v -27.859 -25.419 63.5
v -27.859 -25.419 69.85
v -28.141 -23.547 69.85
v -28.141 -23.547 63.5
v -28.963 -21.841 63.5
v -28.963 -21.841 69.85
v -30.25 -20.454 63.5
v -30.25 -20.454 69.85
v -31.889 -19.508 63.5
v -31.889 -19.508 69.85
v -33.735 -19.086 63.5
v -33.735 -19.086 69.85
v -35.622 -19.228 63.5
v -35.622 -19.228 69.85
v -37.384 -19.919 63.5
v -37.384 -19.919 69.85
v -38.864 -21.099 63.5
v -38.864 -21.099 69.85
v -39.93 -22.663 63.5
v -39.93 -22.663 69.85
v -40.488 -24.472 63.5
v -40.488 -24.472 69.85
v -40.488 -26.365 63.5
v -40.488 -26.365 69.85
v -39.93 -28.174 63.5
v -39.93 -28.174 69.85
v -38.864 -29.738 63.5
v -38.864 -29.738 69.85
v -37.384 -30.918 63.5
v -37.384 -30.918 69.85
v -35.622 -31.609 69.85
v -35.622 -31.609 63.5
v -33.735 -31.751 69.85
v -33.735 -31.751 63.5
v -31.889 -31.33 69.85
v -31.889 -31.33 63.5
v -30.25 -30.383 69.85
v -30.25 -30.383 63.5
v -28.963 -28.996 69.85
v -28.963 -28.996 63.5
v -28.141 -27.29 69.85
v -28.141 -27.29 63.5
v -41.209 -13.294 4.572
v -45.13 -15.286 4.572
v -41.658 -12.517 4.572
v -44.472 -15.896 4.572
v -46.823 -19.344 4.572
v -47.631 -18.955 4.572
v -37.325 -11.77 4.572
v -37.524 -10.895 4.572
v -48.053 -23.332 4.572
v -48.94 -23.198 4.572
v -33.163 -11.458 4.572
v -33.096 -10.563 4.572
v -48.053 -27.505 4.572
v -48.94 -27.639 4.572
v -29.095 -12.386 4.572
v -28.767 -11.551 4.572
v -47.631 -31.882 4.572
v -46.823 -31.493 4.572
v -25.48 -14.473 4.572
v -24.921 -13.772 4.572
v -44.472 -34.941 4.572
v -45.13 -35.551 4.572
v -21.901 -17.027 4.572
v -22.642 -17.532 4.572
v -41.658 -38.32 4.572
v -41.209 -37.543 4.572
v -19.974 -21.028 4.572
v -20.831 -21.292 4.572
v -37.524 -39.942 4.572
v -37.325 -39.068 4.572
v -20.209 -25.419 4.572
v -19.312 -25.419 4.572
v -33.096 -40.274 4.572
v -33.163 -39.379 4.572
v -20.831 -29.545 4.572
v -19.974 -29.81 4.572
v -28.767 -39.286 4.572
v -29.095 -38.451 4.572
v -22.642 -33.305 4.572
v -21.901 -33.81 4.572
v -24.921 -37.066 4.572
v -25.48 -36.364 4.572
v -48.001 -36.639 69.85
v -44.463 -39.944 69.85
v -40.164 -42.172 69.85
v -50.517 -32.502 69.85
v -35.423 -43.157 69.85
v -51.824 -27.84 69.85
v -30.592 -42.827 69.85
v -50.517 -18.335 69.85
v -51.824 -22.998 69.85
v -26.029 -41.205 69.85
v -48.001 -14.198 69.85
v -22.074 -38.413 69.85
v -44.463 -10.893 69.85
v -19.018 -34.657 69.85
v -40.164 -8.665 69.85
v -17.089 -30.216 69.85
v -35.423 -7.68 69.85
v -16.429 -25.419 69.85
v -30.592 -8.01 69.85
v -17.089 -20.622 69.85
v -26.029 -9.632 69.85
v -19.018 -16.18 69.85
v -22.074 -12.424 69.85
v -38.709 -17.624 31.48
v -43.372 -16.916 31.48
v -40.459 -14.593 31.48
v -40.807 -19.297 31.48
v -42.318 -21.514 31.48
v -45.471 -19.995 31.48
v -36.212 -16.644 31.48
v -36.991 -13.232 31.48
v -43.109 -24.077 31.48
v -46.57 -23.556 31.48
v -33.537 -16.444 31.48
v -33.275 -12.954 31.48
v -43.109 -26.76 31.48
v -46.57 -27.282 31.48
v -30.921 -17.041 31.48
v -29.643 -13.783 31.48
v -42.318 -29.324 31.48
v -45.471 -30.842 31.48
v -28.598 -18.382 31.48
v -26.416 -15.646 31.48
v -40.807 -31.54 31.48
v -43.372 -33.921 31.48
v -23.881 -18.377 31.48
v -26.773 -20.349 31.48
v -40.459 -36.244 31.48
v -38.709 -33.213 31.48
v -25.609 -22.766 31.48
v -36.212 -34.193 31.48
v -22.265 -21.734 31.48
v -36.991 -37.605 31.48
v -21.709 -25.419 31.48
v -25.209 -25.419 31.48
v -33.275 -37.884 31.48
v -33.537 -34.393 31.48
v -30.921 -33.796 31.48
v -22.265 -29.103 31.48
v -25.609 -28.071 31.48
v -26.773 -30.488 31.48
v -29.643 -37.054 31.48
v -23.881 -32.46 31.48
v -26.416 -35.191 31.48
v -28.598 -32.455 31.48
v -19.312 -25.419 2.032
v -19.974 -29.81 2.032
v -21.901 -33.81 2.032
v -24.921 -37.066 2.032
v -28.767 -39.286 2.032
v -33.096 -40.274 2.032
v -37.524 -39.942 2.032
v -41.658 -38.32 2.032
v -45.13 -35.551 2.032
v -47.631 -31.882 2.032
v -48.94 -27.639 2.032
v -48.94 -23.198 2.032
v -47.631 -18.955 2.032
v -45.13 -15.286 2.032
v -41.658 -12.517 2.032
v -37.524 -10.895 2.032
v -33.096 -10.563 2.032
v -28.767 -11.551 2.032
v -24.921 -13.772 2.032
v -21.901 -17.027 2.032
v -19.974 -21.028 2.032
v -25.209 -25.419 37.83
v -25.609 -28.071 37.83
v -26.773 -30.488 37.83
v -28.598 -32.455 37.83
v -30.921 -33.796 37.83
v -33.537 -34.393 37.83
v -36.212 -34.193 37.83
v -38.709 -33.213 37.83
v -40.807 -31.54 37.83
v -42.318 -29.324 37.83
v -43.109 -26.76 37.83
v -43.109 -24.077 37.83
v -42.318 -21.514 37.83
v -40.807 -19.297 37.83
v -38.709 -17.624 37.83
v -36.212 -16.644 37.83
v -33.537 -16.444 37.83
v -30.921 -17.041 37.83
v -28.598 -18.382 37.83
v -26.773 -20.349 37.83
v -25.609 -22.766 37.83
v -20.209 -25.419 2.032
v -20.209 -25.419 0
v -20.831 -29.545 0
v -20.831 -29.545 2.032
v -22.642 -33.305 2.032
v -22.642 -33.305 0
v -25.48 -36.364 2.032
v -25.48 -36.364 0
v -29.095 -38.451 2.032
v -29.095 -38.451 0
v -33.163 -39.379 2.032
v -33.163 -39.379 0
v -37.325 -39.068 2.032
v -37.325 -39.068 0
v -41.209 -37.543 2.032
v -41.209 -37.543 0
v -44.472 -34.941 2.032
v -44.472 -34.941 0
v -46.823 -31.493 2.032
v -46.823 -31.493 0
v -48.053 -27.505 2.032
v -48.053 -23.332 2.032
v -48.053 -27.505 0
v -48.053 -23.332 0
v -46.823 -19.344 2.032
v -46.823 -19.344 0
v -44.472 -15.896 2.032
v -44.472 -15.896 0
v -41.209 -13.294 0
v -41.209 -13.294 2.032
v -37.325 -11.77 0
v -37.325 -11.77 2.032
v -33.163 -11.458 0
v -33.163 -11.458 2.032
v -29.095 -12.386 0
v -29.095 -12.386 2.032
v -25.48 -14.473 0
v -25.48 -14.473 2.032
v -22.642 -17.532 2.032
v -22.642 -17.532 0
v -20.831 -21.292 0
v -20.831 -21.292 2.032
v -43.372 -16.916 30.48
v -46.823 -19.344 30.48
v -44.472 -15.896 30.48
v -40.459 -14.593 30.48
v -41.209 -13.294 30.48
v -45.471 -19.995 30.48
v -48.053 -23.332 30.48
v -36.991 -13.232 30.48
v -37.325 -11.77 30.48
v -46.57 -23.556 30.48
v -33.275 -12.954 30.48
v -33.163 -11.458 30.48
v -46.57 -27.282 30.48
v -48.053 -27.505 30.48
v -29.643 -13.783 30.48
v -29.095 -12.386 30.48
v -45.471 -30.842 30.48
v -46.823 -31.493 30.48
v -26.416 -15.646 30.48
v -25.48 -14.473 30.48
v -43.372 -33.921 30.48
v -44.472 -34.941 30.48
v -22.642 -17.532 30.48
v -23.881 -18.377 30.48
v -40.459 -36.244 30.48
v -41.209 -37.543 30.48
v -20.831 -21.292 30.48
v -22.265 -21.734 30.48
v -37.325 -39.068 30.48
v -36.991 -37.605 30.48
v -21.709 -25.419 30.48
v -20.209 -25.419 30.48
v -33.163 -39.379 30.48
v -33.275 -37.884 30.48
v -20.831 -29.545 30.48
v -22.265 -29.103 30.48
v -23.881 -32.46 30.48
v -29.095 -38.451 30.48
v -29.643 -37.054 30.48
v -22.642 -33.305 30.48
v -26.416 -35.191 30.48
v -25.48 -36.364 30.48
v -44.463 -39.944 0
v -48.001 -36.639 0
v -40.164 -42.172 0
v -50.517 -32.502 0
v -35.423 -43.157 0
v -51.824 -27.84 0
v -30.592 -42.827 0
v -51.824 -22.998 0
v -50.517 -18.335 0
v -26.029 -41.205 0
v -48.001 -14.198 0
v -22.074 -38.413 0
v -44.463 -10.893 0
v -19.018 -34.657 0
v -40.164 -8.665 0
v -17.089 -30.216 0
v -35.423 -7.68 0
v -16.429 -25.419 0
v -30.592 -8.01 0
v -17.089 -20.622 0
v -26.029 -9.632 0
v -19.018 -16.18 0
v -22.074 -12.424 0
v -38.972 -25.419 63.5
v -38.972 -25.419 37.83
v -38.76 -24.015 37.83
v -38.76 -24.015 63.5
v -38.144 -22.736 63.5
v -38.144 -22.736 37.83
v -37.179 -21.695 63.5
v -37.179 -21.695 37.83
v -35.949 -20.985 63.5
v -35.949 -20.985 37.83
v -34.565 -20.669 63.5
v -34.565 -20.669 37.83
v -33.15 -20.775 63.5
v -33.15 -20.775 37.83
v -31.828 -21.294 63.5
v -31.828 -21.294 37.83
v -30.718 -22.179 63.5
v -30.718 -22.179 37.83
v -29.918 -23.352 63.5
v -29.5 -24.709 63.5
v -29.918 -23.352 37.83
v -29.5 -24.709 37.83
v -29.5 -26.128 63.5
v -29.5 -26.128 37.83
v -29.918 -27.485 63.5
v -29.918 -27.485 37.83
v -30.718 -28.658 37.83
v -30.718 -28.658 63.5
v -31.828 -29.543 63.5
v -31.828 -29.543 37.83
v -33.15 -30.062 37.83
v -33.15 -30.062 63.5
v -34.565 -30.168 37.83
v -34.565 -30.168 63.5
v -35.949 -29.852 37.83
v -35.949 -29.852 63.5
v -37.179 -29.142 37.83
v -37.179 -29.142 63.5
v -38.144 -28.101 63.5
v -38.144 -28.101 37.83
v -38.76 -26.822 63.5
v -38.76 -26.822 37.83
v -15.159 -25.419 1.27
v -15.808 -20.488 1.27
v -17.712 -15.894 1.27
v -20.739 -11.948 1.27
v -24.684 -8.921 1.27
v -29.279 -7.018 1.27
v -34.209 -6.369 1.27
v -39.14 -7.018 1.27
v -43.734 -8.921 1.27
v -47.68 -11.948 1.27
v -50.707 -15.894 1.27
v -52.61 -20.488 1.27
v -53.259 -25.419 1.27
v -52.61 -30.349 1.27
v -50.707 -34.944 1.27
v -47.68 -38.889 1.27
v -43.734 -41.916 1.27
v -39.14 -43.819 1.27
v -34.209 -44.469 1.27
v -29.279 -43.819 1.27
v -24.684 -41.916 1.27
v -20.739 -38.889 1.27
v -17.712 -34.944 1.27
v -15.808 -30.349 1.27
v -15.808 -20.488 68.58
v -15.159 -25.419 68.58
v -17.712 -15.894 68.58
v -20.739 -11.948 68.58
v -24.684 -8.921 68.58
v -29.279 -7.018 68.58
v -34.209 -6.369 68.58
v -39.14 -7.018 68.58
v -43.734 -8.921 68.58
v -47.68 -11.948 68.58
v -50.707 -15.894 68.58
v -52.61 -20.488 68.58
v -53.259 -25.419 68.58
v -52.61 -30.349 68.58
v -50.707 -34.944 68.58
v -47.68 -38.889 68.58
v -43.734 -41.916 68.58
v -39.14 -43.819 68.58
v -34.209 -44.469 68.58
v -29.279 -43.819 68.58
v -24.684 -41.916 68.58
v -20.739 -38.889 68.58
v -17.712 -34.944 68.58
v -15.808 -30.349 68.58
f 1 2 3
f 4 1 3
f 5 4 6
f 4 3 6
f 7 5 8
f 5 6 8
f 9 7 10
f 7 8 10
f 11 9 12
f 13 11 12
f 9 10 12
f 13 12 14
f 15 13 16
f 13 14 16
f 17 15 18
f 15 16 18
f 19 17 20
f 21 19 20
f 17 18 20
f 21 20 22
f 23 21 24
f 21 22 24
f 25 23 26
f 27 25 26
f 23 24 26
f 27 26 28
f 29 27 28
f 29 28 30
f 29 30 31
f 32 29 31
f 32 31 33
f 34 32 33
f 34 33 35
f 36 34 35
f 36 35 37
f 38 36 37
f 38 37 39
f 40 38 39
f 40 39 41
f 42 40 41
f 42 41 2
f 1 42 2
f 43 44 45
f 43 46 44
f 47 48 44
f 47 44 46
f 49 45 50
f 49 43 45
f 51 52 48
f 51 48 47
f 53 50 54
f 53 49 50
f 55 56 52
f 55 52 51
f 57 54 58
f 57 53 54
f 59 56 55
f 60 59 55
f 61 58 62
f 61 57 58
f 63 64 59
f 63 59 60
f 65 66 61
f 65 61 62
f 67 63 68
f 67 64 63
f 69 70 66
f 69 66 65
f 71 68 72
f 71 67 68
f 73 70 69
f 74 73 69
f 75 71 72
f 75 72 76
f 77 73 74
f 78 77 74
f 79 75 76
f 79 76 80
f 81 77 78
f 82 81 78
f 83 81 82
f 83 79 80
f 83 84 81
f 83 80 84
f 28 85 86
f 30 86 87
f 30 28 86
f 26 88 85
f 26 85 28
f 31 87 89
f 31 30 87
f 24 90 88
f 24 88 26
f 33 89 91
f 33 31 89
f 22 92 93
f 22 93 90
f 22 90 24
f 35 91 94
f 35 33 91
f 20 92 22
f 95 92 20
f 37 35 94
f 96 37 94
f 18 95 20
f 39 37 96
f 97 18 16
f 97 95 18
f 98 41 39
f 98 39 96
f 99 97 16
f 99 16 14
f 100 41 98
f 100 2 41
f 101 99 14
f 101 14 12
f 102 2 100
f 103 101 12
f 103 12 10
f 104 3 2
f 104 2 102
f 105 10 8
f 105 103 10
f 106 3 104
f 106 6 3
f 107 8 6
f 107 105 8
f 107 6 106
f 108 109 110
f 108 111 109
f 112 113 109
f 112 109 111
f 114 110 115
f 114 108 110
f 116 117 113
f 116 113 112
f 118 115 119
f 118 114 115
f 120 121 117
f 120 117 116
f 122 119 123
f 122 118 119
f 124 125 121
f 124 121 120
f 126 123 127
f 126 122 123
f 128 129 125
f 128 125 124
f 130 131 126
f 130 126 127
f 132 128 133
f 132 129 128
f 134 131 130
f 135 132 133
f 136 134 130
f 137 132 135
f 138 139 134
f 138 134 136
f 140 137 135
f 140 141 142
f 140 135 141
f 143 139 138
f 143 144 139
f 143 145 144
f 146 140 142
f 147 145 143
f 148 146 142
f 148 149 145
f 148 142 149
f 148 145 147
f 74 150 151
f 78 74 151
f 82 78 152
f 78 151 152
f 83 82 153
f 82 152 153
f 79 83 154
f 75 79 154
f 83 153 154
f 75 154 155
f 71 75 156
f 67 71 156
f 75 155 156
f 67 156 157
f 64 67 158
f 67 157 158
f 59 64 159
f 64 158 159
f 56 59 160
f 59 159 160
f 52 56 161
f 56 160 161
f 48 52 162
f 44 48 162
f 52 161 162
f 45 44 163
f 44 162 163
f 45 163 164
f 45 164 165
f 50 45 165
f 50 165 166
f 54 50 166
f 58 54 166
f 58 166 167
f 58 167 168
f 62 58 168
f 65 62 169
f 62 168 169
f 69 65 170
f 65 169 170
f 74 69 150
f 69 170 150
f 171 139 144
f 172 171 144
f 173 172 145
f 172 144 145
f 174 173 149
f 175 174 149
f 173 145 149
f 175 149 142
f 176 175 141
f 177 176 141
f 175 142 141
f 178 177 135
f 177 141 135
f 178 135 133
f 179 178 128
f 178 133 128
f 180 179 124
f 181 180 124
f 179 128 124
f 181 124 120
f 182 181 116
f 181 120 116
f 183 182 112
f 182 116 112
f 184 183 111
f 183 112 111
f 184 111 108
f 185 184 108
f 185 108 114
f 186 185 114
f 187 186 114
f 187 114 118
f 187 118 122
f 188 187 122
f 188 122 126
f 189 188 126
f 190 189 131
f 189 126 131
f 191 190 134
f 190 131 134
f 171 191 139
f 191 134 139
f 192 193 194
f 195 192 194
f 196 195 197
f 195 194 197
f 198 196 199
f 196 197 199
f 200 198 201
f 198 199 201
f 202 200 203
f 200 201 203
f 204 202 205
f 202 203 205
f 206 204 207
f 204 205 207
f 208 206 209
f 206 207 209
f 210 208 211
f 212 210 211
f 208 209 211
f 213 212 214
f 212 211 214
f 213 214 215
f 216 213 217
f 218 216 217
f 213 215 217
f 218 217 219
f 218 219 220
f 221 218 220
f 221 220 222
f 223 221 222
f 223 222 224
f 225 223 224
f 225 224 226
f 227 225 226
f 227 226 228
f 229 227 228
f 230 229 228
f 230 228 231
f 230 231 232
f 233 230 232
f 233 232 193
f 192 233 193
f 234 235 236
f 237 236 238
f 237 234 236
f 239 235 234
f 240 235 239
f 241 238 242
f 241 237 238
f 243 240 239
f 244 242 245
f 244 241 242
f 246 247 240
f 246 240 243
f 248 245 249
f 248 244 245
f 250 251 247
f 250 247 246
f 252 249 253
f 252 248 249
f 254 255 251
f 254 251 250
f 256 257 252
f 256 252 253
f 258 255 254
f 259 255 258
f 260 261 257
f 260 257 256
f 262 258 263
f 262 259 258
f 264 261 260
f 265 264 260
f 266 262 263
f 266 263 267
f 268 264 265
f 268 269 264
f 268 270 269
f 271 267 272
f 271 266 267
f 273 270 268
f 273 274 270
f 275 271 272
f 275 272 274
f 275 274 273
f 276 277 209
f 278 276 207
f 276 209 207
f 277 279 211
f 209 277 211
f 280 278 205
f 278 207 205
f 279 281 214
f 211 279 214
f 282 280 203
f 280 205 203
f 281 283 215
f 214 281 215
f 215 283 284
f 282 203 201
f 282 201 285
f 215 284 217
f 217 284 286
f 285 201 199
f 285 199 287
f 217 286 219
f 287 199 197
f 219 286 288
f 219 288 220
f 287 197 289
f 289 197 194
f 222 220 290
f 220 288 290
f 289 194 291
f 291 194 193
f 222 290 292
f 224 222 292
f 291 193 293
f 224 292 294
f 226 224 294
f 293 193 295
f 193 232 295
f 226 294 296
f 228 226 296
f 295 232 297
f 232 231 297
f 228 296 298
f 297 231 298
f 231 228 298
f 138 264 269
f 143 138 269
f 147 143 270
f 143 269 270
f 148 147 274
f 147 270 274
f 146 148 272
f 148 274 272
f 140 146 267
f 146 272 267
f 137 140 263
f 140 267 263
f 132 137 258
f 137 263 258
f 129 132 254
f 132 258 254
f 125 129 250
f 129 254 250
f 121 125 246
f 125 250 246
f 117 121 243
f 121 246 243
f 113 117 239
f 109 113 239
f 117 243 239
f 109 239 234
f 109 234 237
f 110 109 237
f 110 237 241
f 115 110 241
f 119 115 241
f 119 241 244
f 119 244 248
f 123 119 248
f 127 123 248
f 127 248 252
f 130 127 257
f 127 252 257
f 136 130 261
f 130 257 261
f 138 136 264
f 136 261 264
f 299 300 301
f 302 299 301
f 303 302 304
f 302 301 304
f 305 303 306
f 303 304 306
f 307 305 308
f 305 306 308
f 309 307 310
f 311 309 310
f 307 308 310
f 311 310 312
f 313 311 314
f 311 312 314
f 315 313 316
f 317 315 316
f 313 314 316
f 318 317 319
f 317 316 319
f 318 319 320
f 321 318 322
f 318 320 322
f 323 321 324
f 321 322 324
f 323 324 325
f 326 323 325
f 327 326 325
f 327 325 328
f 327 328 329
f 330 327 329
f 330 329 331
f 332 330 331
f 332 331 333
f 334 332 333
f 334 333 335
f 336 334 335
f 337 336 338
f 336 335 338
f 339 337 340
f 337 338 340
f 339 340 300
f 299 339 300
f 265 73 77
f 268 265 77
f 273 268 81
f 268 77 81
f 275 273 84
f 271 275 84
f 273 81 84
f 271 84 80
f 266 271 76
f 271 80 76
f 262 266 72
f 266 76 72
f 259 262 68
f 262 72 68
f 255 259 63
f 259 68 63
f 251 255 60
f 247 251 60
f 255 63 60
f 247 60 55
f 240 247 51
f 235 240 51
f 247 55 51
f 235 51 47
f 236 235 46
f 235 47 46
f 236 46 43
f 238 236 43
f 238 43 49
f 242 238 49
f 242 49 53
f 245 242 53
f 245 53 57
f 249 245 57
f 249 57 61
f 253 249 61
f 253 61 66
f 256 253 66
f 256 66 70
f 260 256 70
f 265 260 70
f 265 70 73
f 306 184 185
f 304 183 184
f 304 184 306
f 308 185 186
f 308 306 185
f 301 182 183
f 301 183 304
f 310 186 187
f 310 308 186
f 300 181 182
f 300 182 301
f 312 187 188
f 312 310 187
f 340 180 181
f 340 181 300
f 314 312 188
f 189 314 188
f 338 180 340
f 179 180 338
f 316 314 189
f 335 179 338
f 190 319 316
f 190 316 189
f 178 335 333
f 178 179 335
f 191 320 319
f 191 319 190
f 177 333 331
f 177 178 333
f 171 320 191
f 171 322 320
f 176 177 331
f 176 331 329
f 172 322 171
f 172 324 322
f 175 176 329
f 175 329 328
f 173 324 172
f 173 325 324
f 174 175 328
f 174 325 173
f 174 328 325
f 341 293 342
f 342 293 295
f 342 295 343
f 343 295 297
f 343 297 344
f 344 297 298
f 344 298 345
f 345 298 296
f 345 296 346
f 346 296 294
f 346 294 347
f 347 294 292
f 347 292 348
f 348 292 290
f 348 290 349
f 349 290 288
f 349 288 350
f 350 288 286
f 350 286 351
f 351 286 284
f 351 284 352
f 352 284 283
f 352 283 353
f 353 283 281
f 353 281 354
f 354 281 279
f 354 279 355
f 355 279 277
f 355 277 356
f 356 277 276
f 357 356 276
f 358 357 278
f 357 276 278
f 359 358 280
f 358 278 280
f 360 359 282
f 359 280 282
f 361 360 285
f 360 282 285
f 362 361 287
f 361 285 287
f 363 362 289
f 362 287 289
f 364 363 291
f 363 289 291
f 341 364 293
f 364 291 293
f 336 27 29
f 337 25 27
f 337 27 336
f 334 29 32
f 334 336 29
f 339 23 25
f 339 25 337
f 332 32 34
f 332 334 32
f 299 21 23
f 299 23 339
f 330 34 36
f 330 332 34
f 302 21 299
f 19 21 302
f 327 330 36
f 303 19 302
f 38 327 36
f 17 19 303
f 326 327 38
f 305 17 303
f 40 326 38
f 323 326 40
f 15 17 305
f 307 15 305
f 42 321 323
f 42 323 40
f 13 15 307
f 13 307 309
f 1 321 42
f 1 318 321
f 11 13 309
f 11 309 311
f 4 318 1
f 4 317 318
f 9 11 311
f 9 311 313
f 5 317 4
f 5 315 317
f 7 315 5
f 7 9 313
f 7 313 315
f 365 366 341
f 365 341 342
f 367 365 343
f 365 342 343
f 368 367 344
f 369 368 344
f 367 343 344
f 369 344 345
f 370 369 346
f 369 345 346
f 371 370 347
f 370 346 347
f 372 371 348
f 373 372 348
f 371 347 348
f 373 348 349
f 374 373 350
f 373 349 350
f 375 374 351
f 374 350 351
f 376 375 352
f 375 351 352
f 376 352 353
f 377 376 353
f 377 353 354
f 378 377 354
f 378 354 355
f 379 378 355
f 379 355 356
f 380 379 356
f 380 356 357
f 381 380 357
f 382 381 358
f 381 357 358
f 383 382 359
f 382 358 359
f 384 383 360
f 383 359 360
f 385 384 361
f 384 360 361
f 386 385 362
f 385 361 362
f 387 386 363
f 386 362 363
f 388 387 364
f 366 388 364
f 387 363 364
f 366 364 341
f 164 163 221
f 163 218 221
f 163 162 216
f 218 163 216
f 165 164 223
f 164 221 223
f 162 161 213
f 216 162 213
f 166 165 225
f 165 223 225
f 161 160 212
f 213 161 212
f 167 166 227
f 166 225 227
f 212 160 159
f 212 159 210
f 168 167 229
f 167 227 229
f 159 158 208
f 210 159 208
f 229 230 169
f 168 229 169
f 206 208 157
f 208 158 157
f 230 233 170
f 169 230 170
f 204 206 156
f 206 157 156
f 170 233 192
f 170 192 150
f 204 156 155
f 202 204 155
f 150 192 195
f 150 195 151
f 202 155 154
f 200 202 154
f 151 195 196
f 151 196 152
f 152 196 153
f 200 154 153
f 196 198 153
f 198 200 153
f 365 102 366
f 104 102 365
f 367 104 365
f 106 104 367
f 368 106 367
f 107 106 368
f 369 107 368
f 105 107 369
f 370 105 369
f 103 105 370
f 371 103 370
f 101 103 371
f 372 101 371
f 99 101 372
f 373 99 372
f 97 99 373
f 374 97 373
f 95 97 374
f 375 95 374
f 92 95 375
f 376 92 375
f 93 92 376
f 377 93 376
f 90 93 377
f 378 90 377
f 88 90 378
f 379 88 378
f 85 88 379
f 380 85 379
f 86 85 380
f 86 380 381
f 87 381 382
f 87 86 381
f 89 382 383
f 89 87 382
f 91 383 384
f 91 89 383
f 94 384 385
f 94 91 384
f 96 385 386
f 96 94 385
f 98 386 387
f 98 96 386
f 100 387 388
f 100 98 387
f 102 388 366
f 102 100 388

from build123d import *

# Parameters (mm, degrees)
F0_R           = 19.05
F1_DEPTH       = 69.85
F2_R           = 14
F3_DEPTH       = 30.48
F4_R           = 12.5
F5_DEPTH       = 1
F7_D           = 9.525
F7_CBORE_D     = 12.7
F7_CBORE_DEPTH = 6.35
F8_R           = 9
F9_DEPTH       = 6.35
F11_R          = 14.8971
F11_R_2        = 14
F12_DEPTH      = 2.54
F13_SIZE       = 1.27


with BuildPart() as f1:
    # F0 (on Top) → F1 (new body)
    with BuildSketch(Plane.XY):
        with Locations((-34.2093408108, -25.4185739905)):
            Circle(F0_R)
    extrude(amount=F1_DEPTH)

    # F2 (on face) → F3 (cut)
    with BuildSketch(Plane(origin=(0, 0, 0), x_dir=(1, 0, 0), z_dir=(0, 0, -1))):
        with Locations((-34.2093408108, 25.4185739905)):
            Circle(F2_R)
    extrude(amount=-F3_DEPTH, mode=Mode.SUBTRACT)

    # F4 (on face) → F5 (cut)
    with BuildSketch(Plane(origin=(0, 0, 30.48), x_dir=(1, 0, 0), z_dir=(0, 0, -1))):
        with Locations((-34.2093408108, 25.4185739905)):
            Circle(F4_R)
    extrude(amount=-F5_DEPTH, mode=Mode.SUBTRACT)

    # F7 (through all)
    with Locations(Plane.XY.offset(69.85)):
        with Locations((-34.2093408108, -25.4185739905)):
            CounterBoreHole(F7_D / 2, F7_CBORE_D / 2, F7_CBORE_DEPTH)

    # F8 (on face) → F9 (cut)
    with BuildSketch(Plane(origin=(0, 0, 31.48), x_dir=(1, 0, 0), z_dir=(0, 0, -1))):
        with Locations((-34.2093408108, 25.4185739905)):
            Circle(F8_R)
    extrude(amount=-F9_DEPTH, mode=Mode.SUBTRACT)

    # F11 (on offset) → F12 (cut)
    with BuildSketch(Plane(origin=(0, 0, 2.032), x_dir=(1, 0, 0), z_dir=(0, 0, -1))):
        with Locations((-34.2093408108, 25.4185739905)):
            Circle(F11_R)
        with Locations((-34.2093408108, 25.4185739905)):
            Circle(F11_R_2, mode=Mode.SUBTRACT)
    extrude(amount=-F12_DEPTH, mode=Mode.SUBTRACT)

    # F13
    f13_edges = [f1.edges().sort_by_distance(p)[0] for p in [
        (-53.259341, -25.418574, 69.85),
        (-53.259341, -25.418574, 0),
    ]]
    chamfer(f13_edges, length=F13_SIZE)


solid = f1.part
